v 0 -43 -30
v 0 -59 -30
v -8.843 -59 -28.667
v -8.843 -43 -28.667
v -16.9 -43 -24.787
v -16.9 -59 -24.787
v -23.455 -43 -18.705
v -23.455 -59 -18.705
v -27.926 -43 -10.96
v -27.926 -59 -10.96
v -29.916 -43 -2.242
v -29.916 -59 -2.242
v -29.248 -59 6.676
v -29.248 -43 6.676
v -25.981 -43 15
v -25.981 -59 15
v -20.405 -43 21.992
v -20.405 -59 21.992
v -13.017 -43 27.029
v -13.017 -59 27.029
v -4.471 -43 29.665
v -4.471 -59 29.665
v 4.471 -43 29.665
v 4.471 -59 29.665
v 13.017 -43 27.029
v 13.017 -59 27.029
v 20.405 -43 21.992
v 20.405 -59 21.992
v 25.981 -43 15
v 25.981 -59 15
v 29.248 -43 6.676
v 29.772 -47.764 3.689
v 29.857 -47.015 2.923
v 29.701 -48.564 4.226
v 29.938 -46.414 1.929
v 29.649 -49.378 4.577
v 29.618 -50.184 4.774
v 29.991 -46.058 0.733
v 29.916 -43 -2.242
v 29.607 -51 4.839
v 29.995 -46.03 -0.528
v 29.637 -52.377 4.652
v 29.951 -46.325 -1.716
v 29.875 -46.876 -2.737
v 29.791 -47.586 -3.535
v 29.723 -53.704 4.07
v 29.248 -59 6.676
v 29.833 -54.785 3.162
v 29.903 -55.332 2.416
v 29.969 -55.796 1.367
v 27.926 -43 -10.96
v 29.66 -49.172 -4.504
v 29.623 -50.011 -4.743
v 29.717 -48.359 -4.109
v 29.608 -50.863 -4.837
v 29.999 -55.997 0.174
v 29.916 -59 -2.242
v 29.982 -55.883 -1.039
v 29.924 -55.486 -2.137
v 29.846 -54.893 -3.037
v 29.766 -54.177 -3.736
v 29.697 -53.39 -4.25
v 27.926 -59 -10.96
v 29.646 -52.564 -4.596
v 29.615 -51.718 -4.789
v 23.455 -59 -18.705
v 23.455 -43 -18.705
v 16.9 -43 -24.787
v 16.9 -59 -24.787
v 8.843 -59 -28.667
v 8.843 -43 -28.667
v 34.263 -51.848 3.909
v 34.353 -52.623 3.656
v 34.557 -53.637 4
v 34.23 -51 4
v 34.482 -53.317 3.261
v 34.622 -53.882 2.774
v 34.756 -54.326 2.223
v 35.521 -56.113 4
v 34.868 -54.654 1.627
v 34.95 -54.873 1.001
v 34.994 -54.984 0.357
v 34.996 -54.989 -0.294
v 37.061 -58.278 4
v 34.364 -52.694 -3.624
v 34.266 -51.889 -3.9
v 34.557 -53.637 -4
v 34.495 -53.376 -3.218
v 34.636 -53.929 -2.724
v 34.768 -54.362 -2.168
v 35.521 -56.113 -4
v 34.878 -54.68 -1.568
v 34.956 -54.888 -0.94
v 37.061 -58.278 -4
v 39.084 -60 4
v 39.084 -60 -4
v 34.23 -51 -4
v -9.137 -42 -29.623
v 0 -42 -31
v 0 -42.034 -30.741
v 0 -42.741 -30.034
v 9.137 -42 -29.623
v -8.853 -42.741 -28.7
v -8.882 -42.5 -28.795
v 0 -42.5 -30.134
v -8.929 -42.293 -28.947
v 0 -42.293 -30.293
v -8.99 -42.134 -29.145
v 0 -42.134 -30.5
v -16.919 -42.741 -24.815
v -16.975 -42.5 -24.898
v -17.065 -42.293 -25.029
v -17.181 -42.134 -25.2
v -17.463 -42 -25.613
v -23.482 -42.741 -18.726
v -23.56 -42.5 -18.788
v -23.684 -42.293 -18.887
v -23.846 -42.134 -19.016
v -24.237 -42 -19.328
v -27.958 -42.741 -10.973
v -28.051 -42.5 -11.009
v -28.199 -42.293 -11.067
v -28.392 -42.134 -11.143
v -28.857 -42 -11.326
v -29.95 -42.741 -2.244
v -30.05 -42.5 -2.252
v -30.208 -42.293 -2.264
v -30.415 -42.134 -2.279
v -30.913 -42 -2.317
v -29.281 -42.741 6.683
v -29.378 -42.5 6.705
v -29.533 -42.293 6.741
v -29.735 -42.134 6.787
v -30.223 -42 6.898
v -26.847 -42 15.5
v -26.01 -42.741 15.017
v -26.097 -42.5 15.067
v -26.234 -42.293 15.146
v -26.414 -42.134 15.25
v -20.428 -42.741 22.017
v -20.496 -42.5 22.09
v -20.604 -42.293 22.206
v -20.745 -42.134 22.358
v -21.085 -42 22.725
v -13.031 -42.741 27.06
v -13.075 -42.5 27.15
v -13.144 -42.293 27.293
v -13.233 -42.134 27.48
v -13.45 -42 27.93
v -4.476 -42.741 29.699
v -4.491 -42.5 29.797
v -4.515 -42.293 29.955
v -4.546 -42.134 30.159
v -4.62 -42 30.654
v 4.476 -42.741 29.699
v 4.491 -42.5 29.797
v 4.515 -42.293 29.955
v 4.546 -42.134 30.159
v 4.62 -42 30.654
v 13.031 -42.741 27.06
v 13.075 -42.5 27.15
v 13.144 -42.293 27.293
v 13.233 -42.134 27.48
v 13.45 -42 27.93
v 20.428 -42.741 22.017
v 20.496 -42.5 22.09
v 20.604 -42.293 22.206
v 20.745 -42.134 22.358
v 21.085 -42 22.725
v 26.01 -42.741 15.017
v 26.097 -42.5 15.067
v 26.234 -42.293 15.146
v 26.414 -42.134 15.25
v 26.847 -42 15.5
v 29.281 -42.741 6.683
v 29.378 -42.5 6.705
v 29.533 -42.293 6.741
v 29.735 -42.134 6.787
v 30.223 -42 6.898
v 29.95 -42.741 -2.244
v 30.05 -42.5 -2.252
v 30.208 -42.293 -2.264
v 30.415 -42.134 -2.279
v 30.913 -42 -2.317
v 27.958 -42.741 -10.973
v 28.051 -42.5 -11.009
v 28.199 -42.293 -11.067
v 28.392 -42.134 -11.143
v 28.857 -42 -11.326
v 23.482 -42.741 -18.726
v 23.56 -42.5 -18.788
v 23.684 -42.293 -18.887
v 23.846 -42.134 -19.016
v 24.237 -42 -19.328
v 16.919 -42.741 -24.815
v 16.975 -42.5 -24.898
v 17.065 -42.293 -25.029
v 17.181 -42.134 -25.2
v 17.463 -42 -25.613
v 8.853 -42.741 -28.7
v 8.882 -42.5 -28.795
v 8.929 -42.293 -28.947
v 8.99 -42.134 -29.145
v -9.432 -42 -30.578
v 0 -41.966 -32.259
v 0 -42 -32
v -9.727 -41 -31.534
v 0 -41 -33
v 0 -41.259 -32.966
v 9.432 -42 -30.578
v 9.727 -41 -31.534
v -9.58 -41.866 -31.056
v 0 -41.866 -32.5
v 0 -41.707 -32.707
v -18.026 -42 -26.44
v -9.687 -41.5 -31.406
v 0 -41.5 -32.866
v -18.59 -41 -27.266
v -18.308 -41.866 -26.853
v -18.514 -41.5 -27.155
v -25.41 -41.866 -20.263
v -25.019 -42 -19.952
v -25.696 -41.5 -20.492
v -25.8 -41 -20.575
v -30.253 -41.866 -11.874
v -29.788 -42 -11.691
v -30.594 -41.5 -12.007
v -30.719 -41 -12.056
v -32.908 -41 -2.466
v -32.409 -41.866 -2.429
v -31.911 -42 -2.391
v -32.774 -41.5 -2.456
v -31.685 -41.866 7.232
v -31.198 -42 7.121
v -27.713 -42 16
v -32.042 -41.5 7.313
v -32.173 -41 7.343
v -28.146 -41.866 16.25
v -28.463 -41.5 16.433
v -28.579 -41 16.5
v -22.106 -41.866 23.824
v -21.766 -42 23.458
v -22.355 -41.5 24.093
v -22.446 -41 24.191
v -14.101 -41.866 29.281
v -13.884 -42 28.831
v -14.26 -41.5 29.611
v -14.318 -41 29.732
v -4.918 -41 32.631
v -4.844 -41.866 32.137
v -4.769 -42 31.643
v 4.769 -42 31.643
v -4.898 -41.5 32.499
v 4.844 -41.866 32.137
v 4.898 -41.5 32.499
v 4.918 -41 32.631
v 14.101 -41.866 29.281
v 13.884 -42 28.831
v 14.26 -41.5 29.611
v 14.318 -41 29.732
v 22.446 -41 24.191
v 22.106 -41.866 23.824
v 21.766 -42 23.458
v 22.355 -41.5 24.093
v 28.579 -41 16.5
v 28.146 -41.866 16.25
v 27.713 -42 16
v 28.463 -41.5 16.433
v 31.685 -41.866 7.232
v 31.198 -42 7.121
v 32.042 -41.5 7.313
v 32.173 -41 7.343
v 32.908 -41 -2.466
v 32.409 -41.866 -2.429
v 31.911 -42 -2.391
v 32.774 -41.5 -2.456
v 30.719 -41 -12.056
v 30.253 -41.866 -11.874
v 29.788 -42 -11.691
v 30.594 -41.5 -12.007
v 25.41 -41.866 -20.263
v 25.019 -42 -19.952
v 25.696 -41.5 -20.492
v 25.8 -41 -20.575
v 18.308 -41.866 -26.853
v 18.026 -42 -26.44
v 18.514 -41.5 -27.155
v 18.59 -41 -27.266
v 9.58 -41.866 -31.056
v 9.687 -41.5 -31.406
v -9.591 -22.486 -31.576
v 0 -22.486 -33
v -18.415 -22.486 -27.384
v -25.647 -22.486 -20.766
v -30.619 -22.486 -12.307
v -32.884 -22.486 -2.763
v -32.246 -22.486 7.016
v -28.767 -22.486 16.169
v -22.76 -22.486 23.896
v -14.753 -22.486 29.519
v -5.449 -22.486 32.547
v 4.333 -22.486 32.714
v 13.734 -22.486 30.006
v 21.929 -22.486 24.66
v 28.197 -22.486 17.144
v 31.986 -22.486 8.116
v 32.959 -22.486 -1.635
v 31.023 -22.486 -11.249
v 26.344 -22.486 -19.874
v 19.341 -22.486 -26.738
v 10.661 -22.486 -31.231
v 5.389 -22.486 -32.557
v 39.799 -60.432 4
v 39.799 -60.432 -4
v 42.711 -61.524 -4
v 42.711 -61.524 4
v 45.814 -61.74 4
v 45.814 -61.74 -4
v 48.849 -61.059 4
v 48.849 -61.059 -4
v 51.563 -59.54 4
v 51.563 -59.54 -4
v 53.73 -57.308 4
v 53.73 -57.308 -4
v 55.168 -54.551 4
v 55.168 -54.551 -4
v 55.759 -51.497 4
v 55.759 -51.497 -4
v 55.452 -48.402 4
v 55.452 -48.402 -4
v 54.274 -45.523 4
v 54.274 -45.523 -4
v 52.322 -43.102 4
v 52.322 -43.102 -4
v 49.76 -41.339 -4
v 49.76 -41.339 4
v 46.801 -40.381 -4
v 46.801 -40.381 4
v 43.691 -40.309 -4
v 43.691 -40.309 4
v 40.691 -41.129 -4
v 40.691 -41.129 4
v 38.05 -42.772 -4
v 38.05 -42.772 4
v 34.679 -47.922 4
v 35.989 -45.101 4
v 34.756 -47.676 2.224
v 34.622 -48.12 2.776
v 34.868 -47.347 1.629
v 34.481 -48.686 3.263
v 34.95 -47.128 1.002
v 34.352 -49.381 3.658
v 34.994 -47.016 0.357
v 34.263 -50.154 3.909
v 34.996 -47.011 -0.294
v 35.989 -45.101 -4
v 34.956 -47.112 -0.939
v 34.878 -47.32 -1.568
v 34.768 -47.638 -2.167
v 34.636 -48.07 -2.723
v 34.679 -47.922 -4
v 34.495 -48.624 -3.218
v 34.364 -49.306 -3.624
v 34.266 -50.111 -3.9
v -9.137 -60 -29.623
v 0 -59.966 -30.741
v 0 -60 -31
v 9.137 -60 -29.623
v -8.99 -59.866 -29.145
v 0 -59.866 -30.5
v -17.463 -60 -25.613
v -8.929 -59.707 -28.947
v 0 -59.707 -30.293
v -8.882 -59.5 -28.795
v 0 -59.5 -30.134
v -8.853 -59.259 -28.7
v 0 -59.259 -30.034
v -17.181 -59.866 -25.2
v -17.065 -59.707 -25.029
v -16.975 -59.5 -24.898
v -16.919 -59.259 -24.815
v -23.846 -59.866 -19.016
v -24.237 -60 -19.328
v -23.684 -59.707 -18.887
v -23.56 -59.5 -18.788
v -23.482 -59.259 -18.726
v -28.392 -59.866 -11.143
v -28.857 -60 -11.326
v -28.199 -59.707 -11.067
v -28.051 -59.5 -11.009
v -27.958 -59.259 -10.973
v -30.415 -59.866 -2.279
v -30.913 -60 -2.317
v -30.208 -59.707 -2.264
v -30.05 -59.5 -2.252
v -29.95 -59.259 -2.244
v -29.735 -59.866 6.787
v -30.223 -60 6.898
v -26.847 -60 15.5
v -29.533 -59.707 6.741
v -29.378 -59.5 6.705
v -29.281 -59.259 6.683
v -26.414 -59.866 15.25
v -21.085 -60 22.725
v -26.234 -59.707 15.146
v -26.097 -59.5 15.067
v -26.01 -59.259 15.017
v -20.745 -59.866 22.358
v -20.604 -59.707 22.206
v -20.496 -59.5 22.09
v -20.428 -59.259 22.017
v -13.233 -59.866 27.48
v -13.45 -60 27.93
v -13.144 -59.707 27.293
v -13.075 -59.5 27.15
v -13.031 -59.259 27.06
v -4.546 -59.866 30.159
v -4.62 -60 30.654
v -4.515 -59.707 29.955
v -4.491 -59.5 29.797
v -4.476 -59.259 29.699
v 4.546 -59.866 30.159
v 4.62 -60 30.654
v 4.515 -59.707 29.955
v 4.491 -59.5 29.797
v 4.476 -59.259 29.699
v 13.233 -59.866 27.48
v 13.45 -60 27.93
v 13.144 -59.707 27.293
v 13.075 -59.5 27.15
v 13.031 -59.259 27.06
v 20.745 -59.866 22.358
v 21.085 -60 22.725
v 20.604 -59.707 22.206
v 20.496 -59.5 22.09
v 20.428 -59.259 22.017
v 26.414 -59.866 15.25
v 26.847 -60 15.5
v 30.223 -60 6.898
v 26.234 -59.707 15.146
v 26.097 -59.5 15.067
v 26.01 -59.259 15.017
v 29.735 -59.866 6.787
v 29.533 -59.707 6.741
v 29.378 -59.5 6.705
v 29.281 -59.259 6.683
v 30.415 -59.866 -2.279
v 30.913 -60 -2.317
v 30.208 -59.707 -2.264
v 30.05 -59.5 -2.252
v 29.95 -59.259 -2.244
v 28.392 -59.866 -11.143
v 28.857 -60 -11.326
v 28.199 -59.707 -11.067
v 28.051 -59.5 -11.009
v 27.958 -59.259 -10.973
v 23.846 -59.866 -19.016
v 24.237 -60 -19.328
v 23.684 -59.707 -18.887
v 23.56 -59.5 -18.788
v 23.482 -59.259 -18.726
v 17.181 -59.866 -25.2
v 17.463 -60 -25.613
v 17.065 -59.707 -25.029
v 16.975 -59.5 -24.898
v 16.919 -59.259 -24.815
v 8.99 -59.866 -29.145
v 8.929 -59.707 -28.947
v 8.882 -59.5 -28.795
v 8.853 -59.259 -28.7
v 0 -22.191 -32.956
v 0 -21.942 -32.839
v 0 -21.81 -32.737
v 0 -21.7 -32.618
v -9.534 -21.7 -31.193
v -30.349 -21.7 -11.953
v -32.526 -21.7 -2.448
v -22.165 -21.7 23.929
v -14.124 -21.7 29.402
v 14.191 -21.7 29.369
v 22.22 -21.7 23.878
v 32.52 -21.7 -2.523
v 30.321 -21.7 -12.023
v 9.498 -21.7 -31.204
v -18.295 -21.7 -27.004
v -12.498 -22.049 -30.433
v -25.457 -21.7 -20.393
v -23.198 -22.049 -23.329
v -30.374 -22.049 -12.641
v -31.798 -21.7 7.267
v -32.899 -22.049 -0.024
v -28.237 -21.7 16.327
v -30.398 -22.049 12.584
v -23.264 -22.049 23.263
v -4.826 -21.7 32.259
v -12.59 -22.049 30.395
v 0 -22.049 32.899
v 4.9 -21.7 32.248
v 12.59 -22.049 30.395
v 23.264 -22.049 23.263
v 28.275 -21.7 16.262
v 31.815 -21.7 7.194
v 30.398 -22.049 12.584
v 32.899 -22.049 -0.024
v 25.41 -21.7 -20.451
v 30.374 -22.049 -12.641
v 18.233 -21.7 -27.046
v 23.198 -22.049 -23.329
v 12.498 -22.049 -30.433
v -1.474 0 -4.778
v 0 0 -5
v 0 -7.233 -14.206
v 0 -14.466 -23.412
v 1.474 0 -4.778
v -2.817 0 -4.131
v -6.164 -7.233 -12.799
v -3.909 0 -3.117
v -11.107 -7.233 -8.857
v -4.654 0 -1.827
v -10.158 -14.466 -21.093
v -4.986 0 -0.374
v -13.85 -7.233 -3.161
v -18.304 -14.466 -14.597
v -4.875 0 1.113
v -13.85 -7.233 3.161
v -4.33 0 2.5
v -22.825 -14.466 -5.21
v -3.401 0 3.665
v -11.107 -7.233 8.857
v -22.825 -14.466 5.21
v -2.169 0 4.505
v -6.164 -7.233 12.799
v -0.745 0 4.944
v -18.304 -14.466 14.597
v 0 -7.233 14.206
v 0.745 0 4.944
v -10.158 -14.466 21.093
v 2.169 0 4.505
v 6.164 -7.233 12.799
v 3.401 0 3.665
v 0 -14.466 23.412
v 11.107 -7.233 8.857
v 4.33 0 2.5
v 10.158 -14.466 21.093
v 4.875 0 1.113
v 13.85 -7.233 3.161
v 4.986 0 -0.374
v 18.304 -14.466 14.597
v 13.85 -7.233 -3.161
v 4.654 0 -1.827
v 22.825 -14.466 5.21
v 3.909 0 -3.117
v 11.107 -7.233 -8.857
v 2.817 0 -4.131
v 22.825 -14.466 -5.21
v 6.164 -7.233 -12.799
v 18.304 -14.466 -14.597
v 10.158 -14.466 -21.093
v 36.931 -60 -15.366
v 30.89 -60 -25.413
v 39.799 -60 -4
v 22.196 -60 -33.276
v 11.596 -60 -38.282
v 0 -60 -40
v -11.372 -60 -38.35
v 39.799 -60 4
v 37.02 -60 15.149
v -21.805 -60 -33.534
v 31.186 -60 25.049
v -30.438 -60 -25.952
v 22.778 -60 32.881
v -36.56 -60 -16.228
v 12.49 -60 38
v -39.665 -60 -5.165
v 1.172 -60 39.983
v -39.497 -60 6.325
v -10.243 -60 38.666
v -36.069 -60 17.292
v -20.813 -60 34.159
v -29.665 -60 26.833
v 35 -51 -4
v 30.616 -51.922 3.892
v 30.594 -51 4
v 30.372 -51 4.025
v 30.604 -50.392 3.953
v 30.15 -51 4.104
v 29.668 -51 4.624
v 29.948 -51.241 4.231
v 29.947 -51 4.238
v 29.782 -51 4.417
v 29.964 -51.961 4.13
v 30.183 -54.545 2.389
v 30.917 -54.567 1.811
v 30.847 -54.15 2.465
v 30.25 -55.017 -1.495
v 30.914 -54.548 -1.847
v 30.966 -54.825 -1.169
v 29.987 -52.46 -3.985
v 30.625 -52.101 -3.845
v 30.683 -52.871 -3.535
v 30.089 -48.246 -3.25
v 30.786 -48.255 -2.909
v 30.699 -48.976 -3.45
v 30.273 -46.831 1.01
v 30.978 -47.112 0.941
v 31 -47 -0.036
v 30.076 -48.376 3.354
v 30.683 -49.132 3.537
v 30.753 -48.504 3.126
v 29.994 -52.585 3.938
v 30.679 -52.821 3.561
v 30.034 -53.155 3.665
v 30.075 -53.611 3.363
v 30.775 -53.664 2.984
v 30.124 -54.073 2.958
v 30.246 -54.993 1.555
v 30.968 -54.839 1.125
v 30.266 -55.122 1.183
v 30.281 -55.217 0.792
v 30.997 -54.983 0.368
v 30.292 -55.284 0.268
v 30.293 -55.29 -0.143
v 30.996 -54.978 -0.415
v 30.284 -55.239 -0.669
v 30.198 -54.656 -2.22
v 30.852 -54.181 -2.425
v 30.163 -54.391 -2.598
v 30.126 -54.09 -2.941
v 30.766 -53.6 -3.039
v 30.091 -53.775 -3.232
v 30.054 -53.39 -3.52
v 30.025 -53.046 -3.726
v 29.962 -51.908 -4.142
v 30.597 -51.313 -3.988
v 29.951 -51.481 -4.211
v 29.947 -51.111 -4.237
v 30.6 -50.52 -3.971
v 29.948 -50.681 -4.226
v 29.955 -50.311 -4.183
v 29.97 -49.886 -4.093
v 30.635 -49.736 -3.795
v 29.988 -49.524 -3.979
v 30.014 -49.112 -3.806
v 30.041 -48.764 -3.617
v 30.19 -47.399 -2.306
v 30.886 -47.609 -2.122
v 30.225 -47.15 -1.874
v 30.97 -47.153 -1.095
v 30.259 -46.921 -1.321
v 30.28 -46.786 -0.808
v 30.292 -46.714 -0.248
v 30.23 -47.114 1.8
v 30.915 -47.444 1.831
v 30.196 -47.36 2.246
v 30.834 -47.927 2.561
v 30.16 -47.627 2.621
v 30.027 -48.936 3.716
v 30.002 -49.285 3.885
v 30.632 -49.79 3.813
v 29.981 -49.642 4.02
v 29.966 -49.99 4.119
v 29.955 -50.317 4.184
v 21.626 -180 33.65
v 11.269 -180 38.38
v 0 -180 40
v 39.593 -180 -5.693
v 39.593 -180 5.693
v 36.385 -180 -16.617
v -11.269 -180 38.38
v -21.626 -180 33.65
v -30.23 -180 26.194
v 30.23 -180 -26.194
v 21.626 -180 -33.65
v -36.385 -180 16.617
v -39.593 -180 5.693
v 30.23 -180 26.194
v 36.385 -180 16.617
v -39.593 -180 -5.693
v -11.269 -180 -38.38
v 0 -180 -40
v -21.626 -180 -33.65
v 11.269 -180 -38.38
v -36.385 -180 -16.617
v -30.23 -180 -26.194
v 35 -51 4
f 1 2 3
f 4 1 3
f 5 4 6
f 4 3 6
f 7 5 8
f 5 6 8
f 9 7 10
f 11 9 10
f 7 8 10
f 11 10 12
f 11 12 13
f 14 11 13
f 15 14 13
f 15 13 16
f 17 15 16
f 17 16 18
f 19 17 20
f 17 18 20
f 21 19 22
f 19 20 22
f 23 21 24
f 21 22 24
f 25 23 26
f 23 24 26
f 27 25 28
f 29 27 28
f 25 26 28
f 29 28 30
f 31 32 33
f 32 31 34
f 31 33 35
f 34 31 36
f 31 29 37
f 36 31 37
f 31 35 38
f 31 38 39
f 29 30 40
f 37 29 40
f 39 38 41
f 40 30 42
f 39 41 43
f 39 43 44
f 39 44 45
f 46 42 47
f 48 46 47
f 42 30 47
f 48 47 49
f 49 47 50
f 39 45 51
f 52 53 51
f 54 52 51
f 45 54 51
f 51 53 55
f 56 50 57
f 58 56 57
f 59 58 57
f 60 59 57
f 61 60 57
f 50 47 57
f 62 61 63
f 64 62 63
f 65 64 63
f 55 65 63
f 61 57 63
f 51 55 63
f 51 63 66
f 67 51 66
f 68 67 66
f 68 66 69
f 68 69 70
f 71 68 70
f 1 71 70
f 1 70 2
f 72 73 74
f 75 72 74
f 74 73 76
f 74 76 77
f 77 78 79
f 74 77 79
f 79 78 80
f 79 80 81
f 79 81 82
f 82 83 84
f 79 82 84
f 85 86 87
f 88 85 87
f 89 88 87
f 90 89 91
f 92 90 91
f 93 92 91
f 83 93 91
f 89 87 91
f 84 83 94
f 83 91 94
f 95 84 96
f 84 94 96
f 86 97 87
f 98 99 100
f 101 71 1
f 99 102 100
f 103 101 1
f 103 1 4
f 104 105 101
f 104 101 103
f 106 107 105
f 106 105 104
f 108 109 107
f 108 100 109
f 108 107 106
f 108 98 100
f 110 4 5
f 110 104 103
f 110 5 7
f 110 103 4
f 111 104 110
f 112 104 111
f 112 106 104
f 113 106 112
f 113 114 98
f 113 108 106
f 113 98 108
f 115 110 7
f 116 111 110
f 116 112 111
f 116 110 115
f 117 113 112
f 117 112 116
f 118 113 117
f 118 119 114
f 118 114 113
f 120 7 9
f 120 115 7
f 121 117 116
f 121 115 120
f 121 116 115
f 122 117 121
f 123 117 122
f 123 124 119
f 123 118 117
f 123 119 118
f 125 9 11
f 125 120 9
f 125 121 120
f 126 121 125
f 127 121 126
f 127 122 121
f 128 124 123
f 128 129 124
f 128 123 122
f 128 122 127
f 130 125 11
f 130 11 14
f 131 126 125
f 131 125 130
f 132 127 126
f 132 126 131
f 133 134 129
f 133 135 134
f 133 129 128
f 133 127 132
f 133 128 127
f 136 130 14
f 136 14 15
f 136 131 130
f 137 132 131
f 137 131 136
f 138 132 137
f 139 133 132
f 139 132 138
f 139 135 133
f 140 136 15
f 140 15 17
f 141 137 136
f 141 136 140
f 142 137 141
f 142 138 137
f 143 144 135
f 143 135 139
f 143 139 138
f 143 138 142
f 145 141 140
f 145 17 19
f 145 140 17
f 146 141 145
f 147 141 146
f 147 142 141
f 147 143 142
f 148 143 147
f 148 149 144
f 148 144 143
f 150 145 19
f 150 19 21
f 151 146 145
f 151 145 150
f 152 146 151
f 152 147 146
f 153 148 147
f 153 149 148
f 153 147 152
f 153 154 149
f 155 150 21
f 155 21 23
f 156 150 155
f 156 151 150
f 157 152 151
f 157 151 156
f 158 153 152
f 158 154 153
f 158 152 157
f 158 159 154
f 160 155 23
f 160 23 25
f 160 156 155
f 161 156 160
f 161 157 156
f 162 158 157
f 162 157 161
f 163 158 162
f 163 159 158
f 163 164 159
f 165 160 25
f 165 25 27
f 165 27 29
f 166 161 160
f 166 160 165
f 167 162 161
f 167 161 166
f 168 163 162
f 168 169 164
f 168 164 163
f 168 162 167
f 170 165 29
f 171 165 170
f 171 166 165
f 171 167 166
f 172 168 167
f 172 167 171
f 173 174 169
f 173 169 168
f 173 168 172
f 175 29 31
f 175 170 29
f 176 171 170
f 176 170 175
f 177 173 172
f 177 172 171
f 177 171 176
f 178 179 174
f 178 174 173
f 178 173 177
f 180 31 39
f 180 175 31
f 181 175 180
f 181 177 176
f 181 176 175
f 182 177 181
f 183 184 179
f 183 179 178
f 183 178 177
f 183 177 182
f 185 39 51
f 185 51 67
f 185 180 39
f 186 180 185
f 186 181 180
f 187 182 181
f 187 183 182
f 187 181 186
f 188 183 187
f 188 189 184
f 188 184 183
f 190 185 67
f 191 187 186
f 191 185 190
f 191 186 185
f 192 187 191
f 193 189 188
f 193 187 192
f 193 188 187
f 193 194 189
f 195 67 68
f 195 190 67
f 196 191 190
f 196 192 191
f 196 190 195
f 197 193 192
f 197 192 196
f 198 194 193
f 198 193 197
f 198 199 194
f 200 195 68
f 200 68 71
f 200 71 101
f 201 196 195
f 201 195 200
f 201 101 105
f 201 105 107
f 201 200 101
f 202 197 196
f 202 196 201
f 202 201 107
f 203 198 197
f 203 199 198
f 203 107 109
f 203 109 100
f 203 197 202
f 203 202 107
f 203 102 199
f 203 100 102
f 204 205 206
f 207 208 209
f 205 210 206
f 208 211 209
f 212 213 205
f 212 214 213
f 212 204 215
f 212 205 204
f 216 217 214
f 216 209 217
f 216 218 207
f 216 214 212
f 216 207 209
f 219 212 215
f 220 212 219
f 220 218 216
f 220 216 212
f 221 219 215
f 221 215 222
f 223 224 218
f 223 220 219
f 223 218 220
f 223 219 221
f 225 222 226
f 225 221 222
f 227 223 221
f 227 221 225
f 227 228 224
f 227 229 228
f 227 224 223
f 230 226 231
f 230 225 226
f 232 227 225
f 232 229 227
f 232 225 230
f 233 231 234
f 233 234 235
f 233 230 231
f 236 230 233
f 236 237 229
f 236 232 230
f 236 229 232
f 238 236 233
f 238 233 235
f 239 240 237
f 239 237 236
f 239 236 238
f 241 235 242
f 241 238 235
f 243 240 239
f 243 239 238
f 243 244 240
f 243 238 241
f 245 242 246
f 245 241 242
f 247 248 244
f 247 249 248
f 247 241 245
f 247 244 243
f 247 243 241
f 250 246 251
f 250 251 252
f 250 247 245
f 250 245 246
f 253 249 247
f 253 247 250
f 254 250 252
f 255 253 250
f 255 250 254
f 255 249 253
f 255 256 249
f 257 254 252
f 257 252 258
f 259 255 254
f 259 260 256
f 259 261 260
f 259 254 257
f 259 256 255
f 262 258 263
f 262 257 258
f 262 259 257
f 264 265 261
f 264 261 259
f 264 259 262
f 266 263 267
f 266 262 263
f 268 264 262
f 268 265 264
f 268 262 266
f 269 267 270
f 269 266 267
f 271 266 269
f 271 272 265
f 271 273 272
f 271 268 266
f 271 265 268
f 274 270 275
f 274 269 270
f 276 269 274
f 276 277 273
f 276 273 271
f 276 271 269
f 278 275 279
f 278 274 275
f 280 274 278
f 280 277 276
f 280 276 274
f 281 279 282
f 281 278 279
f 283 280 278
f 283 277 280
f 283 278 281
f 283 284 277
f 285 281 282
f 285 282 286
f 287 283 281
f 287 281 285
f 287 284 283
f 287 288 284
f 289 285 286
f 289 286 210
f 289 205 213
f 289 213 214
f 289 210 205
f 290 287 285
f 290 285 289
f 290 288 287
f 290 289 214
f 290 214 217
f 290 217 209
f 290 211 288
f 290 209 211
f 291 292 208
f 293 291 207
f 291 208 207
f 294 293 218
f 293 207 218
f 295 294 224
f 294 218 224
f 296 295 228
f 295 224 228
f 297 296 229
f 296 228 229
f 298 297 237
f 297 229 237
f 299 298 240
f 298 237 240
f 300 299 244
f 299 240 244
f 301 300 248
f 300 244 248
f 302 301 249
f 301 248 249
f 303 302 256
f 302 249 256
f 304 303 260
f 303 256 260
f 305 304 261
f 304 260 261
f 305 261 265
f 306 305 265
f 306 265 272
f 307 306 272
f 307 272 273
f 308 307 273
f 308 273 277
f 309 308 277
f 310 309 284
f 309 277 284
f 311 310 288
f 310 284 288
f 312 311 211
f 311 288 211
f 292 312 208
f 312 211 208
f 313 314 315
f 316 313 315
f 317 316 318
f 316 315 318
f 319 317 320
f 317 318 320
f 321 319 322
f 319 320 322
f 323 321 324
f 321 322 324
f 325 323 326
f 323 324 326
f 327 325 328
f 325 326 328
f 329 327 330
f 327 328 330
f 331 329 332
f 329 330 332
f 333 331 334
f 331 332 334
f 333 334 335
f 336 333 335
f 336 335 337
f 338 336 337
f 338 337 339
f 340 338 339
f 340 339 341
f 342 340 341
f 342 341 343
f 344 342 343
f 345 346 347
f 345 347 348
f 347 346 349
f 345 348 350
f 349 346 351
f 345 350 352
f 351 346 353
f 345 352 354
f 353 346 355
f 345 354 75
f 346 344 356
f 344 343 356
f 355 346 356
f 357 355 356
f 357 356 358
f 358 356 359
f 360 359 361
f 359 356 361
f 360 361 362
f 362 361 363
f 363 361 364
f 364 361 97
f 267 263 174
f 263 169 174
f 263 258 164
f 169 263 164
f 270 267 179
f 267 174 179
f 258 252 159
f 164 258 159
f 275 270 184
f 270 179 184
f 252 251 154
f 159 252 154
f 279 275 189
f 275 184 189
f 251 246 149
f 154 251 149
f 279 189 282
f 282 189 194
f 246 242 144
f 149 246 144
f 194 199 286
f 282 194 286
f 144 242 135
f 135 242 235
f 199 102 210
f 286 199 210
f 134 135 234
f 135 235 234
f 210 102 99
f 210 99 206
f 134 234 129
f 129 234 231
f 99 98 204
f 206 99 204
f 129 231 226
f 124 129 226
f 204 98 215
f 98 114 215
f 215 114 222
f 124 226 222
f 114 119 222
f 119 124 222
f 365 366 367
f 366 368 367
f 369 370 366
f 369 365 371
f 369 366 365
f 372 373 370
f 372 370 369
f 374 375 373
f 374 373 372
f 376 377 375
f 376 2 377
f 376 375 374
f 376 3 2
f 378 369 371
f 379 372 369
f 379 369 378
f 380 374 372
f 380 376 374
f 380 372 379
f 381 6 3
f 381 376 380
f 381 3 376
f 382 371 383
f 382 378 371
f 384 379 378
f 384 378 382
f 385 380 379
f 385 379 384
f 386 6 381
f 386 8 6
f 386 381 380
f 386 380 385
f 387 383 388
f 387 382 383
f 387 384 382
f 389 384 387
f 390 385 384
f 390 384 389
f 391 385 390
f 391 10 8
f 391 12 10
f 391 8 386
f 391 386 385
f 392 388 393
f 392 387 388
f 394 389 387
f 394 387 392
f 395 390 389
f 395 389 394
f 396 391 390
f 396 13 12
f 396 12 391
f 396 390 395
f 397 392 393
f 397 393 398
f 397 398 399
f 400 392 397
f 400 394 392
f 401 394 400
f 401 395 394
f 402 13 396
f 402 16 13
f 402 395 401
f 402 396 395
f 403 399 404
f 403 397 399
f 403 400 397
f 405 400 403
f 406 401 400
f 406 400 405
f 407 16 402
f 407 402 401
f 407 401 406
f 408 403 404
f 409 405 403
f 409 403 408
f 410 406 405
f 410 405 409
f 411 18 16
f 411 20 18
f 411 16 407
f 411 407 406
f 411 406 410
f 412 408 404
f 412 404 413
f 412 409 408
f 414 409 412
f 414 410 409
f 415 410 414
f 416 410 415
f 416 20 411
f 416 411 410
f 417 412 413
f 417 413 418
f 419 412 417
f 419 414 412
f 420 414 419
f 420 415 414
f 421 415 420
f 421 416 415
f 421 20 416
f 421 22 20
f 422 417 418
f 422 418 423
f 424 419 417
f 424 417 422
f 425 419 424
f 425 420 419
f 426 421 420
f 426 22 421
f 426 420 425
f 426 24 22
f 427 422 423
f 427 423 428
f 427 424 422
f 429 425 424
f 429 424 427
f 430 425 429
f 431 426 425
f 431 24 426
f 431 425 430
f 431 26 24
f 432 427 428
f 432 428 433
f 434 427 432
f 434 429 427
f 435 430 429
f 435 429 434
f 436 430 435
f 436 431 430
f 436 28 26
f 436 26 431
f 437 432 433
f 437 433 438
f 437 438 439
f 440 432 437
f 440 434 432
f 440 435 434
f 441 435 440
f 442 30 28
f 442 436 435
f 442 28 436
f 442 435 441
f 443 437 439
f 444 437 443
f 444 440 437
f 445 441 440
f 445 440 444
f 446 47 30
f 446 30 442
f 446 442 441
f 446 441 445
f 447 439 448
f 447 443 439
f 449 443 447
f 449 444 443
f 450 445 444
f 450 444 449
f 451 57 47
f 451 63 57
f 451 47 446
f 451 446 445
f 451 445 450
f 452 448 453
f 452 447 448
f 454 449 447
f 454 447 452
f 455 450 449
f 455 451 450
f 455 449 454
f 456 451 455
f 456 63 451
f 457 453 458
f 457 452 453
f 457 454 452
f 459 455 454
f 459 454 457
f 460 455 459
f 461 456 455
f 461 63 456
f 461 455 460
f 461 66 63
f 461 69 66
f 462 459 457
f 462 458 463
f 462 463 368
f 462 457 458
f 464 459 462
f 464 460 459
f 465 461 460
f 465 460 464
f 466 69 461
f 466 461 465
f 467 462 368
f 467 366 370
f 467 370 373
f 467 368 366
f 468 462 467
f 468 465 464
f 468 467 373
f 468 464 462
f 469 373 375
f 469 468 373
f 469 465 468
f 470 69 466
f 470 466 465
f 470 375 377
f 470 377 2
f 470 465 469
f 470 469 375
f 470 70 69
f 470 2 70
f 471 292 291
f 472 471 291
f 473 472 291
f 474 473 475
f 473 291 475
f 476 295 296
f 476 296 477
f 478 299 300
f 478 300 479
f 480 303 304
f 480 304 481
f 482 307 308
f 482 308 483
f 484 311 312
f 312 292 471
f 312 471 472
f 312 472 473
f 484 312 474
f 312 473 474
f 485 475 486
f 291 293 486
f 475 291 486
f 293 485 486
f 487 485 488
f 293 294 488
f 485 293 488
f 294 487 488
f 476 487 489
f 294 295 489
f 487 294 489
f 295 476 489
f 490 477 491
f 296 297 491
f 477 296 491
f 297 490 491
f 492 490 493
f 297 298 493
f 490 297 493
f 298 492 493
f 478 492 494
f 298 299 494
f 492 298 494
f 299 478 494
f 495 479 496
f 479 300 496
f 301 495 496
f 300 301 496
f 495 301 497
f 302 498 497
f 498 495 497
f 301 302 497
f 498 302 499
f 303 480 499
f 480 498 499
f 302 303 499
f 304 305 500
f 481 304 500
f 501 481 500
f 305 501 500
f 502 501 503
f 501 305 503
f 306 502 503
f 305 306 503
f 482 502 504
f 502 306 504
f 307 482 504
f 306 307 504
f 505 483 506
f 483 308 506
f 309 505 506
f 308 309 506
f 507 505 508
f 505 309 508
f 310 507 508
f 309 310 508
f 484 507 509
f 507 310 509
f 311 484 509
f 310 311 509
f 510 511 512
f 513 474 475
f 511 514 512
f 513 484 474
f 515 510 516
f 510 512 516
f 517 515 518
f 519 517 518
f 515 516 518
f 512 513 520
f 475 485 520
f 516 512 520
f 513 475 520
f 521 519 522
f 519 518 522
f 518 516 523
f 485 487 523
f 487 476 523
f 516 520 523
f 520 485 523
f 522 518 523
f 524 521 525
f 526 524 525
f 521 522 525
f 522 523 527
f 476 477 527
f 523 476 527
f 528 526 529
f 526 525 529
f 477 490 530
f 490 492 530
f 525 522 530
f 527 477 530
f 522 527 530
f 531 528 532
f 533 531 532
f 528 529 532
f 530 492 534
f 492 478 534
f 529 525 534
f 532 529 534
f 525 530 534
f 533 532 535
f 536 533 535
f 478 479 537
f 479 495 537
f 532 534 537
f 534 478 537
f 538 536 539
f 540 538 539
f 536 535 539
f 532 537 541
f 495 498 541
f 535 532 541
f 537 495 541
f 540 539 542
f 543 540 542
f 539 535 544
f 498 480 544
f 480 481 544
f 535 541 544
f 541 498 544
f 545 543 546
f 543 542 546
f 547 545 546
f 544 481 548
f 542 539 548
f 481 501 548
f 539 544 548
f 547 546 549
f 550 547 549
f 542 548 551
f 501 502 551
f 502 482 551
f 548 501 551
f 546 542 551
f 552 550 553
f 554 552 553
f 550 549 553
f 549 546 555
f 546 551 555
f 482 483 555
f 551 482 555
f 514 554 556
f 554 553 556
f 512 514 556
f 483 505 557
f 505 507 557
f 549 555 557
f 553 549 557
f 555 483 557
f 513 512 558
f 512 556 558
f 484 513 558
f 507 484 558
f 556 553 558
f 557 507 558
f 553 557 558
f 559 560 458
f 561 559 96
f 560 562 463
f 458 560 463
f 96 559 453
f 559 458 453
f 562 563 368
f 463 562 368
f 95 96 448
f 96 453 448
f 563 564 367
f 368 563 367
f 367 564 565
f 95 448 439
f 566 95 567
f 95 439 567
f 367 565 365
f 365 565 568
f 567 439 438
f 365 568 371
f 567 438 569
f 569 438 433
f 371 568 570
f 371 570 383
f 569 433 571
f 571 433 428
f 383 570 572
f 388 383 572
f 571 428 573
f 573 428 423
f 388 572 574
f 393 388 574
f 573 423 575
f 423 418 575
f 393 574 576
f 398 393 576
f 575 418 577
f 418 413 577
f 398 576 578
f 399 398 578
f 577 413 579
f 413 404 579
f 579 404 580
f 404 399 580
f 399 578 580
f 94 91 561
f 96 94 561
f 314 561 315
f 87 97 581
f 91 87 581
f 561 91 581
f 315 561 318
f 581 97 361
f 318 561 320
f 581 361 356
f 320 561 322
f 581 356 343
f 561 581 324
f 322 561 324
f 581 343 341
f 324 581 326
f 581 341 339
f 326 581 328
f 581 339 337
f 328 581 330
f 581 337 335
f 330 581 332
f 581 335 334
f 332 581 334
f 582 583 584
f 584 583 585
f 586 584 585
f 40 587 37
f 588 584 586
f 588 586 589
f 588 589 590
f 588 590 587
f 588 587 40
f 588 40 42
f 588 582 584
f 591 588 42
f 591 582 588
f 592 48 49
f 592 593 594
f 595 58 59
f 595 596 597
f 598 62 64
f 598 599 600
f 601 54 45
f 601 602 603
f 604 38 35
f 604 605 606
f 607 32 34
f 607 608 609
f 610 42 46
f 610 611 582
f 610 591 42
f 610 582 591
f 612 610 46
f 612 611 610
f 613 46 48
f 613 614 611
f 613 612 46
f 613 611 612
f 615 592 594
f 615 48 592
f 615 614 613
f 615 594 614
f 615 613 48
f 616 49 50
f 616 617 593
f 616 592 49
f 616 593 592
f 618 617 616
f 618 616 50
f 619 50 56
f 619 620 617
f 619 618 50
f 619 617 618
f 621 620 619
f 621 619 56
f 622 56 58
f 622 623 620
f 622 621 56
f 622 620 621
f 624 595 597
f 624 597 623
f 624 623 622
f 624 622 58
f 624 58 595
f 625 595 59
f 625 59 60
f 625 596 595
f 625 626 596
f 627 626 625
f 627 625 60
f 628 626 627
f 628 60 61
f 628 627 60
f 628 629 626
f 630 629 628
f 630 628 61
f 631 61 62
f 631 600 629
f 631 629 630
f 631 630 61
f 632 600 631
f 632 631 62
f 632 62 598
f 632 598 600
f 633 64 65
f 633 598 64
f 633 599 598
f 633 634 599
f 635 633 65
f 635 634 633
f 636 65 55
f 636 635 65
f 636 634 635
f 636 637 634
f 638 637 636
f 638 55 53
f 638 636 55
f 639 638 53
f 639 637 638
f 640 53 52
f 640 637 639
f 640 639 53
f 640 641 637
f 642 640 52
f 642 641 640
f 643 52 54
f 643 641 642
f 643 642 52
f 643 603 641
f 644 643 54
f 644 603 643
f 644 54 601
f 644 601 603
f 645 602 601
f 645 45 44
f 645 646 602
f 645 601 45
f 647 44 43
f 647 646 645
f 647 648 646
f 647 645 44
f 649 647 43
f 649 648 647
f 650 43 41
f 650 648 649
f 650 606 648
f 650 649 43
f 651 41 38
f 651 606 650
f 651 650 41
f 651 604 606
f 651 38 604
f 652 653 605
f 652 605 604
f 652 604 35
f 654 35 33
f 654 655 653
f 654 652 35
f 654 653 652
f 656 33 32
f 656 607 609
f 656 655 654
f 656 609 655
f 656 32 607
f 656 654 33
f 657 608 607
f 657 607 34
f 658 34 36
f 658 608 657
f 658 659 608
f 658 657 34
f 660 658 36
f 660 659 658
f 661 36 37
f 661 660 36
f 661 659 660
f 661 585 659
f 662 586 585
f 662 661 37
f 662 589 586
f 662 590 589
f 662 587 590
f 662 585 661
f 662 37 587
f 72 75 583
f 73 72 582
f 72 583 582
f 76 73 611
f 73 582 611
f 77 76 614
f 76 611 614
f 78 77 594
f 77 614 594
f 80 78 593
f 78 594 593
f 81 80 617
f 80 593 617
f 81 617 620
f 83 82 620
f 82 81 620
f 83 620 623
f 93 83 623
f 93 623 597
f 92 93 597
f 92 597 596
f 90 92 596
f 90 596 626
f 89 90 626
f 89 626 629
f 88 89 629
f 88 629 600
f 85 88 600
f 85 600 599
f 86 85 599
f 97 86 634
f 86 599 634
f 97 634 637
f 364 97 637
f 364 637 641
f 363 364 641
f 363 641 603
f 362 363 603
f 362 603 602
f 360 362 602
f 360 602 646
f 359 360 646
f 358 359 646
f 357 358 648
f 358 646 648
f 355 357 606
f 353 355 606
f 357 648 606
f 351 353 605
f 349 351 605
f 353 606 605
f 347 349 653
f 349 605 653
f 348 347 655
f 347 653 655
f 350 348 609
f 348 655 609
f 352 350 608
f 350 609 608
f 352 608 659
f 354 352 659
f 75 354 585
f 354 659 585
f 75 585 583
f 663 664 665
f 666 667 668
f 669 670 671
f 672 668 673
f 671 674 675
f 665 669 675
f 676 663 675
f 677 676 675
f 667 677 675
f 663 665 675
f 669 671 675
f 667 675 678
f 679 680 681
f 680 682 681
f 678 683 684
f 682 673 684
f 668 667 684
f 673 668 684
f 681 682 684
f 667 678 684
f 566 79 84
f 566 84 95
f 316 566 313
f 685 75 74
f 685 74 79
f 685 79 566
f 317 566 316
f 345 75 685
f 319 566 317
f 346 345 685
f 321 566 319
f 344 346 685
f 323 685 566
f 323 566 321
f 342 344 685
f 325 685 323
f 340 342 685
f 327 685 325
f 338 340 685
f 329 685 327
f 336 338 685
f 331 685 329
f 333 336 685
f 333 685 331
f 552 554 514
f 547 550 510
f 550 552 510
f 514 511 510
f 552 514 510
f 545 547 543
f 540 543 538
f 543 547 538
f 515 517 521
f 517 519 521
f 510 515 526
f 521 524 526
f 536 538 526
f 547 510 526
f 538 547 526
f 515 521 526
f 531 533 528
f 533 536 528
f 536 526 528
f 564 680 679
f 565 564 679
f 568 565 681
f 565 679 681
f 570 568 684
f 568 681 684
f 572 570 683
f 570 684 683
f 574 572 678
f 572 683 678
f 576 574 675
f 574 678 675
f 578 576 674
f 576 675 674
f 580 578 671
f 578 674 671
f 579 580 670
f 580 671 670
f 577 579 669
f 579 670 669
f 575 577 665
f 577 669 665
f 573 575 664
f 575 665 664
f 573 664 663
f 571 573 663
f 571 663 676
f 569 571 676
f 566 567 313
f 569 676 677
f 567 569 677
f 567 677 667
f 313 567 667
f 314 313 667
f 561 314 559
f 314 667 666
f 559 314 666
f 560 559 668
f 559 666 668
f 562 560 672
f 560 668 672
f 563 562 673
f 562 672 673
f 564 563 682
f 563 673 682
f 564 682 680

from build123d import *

# Parameters (mm, degrees)
SKETCH_2_R           = 4
EXTRUDE_1_DEPTH      = 35
EXTRUDE_2_DEPTH      = 4
EXTRUDE_2_DEPTH_BACK = 4
SKETCH_3_R           = 10.770329614
FILLET_3_R           = 1


with BuildPart() as part:
    # 草图1 → 旋转1 (revolve)
    with BuildSketch(Plane.XY):
        Polygon((0, 0), (5, 0), (33, -22), (33, -42), (30, -42), (30, -60), (40, -60), (40, -180), (0, -180), align=None)
    revolve(axis=Axis((0, -180, 0), (0, 1, 0)))

    # 草图2 → 凸台-拉伸1 (add)
    with BuildSketch(Plane(origin=(0, 0, 0), x_dir=(0, 0, -1), z_dir=(1, 0, 0))):
        with Locations((0, -51)):
            Circle(SKETCH_2_R)
    extrude(amount=EXTRUDE_1_DEPTH)

    # 草图3 → 凸台-拉伸2 (add, two sides: drawn at the far end of the back side and taken through both)
    with BuildSketch(Plane.XY.offset(-EXTRUDE_2_DEPTH_BACK)):
        with Locations((45, -51)):
            Circle(SKETCH_3_R)
    extrude(amount=EXTRUDE_2_DEPTH + EXTRUDE_2_DEPTH_BACK)

    # 圆角3
    fillet_3_edges = [part.edges().sort_by_distance(p)[0] for p in [
        (29.866368157, -48.17158234, -2.828436552),
        (-30, -60, 0),
        (-30, -42, 0),
        (-33, -22, 0),
        (-33, -42, 0),
    ]]
    fillet(fillet_3_edges, radius=FILLET_3_R)


solid = part.part
